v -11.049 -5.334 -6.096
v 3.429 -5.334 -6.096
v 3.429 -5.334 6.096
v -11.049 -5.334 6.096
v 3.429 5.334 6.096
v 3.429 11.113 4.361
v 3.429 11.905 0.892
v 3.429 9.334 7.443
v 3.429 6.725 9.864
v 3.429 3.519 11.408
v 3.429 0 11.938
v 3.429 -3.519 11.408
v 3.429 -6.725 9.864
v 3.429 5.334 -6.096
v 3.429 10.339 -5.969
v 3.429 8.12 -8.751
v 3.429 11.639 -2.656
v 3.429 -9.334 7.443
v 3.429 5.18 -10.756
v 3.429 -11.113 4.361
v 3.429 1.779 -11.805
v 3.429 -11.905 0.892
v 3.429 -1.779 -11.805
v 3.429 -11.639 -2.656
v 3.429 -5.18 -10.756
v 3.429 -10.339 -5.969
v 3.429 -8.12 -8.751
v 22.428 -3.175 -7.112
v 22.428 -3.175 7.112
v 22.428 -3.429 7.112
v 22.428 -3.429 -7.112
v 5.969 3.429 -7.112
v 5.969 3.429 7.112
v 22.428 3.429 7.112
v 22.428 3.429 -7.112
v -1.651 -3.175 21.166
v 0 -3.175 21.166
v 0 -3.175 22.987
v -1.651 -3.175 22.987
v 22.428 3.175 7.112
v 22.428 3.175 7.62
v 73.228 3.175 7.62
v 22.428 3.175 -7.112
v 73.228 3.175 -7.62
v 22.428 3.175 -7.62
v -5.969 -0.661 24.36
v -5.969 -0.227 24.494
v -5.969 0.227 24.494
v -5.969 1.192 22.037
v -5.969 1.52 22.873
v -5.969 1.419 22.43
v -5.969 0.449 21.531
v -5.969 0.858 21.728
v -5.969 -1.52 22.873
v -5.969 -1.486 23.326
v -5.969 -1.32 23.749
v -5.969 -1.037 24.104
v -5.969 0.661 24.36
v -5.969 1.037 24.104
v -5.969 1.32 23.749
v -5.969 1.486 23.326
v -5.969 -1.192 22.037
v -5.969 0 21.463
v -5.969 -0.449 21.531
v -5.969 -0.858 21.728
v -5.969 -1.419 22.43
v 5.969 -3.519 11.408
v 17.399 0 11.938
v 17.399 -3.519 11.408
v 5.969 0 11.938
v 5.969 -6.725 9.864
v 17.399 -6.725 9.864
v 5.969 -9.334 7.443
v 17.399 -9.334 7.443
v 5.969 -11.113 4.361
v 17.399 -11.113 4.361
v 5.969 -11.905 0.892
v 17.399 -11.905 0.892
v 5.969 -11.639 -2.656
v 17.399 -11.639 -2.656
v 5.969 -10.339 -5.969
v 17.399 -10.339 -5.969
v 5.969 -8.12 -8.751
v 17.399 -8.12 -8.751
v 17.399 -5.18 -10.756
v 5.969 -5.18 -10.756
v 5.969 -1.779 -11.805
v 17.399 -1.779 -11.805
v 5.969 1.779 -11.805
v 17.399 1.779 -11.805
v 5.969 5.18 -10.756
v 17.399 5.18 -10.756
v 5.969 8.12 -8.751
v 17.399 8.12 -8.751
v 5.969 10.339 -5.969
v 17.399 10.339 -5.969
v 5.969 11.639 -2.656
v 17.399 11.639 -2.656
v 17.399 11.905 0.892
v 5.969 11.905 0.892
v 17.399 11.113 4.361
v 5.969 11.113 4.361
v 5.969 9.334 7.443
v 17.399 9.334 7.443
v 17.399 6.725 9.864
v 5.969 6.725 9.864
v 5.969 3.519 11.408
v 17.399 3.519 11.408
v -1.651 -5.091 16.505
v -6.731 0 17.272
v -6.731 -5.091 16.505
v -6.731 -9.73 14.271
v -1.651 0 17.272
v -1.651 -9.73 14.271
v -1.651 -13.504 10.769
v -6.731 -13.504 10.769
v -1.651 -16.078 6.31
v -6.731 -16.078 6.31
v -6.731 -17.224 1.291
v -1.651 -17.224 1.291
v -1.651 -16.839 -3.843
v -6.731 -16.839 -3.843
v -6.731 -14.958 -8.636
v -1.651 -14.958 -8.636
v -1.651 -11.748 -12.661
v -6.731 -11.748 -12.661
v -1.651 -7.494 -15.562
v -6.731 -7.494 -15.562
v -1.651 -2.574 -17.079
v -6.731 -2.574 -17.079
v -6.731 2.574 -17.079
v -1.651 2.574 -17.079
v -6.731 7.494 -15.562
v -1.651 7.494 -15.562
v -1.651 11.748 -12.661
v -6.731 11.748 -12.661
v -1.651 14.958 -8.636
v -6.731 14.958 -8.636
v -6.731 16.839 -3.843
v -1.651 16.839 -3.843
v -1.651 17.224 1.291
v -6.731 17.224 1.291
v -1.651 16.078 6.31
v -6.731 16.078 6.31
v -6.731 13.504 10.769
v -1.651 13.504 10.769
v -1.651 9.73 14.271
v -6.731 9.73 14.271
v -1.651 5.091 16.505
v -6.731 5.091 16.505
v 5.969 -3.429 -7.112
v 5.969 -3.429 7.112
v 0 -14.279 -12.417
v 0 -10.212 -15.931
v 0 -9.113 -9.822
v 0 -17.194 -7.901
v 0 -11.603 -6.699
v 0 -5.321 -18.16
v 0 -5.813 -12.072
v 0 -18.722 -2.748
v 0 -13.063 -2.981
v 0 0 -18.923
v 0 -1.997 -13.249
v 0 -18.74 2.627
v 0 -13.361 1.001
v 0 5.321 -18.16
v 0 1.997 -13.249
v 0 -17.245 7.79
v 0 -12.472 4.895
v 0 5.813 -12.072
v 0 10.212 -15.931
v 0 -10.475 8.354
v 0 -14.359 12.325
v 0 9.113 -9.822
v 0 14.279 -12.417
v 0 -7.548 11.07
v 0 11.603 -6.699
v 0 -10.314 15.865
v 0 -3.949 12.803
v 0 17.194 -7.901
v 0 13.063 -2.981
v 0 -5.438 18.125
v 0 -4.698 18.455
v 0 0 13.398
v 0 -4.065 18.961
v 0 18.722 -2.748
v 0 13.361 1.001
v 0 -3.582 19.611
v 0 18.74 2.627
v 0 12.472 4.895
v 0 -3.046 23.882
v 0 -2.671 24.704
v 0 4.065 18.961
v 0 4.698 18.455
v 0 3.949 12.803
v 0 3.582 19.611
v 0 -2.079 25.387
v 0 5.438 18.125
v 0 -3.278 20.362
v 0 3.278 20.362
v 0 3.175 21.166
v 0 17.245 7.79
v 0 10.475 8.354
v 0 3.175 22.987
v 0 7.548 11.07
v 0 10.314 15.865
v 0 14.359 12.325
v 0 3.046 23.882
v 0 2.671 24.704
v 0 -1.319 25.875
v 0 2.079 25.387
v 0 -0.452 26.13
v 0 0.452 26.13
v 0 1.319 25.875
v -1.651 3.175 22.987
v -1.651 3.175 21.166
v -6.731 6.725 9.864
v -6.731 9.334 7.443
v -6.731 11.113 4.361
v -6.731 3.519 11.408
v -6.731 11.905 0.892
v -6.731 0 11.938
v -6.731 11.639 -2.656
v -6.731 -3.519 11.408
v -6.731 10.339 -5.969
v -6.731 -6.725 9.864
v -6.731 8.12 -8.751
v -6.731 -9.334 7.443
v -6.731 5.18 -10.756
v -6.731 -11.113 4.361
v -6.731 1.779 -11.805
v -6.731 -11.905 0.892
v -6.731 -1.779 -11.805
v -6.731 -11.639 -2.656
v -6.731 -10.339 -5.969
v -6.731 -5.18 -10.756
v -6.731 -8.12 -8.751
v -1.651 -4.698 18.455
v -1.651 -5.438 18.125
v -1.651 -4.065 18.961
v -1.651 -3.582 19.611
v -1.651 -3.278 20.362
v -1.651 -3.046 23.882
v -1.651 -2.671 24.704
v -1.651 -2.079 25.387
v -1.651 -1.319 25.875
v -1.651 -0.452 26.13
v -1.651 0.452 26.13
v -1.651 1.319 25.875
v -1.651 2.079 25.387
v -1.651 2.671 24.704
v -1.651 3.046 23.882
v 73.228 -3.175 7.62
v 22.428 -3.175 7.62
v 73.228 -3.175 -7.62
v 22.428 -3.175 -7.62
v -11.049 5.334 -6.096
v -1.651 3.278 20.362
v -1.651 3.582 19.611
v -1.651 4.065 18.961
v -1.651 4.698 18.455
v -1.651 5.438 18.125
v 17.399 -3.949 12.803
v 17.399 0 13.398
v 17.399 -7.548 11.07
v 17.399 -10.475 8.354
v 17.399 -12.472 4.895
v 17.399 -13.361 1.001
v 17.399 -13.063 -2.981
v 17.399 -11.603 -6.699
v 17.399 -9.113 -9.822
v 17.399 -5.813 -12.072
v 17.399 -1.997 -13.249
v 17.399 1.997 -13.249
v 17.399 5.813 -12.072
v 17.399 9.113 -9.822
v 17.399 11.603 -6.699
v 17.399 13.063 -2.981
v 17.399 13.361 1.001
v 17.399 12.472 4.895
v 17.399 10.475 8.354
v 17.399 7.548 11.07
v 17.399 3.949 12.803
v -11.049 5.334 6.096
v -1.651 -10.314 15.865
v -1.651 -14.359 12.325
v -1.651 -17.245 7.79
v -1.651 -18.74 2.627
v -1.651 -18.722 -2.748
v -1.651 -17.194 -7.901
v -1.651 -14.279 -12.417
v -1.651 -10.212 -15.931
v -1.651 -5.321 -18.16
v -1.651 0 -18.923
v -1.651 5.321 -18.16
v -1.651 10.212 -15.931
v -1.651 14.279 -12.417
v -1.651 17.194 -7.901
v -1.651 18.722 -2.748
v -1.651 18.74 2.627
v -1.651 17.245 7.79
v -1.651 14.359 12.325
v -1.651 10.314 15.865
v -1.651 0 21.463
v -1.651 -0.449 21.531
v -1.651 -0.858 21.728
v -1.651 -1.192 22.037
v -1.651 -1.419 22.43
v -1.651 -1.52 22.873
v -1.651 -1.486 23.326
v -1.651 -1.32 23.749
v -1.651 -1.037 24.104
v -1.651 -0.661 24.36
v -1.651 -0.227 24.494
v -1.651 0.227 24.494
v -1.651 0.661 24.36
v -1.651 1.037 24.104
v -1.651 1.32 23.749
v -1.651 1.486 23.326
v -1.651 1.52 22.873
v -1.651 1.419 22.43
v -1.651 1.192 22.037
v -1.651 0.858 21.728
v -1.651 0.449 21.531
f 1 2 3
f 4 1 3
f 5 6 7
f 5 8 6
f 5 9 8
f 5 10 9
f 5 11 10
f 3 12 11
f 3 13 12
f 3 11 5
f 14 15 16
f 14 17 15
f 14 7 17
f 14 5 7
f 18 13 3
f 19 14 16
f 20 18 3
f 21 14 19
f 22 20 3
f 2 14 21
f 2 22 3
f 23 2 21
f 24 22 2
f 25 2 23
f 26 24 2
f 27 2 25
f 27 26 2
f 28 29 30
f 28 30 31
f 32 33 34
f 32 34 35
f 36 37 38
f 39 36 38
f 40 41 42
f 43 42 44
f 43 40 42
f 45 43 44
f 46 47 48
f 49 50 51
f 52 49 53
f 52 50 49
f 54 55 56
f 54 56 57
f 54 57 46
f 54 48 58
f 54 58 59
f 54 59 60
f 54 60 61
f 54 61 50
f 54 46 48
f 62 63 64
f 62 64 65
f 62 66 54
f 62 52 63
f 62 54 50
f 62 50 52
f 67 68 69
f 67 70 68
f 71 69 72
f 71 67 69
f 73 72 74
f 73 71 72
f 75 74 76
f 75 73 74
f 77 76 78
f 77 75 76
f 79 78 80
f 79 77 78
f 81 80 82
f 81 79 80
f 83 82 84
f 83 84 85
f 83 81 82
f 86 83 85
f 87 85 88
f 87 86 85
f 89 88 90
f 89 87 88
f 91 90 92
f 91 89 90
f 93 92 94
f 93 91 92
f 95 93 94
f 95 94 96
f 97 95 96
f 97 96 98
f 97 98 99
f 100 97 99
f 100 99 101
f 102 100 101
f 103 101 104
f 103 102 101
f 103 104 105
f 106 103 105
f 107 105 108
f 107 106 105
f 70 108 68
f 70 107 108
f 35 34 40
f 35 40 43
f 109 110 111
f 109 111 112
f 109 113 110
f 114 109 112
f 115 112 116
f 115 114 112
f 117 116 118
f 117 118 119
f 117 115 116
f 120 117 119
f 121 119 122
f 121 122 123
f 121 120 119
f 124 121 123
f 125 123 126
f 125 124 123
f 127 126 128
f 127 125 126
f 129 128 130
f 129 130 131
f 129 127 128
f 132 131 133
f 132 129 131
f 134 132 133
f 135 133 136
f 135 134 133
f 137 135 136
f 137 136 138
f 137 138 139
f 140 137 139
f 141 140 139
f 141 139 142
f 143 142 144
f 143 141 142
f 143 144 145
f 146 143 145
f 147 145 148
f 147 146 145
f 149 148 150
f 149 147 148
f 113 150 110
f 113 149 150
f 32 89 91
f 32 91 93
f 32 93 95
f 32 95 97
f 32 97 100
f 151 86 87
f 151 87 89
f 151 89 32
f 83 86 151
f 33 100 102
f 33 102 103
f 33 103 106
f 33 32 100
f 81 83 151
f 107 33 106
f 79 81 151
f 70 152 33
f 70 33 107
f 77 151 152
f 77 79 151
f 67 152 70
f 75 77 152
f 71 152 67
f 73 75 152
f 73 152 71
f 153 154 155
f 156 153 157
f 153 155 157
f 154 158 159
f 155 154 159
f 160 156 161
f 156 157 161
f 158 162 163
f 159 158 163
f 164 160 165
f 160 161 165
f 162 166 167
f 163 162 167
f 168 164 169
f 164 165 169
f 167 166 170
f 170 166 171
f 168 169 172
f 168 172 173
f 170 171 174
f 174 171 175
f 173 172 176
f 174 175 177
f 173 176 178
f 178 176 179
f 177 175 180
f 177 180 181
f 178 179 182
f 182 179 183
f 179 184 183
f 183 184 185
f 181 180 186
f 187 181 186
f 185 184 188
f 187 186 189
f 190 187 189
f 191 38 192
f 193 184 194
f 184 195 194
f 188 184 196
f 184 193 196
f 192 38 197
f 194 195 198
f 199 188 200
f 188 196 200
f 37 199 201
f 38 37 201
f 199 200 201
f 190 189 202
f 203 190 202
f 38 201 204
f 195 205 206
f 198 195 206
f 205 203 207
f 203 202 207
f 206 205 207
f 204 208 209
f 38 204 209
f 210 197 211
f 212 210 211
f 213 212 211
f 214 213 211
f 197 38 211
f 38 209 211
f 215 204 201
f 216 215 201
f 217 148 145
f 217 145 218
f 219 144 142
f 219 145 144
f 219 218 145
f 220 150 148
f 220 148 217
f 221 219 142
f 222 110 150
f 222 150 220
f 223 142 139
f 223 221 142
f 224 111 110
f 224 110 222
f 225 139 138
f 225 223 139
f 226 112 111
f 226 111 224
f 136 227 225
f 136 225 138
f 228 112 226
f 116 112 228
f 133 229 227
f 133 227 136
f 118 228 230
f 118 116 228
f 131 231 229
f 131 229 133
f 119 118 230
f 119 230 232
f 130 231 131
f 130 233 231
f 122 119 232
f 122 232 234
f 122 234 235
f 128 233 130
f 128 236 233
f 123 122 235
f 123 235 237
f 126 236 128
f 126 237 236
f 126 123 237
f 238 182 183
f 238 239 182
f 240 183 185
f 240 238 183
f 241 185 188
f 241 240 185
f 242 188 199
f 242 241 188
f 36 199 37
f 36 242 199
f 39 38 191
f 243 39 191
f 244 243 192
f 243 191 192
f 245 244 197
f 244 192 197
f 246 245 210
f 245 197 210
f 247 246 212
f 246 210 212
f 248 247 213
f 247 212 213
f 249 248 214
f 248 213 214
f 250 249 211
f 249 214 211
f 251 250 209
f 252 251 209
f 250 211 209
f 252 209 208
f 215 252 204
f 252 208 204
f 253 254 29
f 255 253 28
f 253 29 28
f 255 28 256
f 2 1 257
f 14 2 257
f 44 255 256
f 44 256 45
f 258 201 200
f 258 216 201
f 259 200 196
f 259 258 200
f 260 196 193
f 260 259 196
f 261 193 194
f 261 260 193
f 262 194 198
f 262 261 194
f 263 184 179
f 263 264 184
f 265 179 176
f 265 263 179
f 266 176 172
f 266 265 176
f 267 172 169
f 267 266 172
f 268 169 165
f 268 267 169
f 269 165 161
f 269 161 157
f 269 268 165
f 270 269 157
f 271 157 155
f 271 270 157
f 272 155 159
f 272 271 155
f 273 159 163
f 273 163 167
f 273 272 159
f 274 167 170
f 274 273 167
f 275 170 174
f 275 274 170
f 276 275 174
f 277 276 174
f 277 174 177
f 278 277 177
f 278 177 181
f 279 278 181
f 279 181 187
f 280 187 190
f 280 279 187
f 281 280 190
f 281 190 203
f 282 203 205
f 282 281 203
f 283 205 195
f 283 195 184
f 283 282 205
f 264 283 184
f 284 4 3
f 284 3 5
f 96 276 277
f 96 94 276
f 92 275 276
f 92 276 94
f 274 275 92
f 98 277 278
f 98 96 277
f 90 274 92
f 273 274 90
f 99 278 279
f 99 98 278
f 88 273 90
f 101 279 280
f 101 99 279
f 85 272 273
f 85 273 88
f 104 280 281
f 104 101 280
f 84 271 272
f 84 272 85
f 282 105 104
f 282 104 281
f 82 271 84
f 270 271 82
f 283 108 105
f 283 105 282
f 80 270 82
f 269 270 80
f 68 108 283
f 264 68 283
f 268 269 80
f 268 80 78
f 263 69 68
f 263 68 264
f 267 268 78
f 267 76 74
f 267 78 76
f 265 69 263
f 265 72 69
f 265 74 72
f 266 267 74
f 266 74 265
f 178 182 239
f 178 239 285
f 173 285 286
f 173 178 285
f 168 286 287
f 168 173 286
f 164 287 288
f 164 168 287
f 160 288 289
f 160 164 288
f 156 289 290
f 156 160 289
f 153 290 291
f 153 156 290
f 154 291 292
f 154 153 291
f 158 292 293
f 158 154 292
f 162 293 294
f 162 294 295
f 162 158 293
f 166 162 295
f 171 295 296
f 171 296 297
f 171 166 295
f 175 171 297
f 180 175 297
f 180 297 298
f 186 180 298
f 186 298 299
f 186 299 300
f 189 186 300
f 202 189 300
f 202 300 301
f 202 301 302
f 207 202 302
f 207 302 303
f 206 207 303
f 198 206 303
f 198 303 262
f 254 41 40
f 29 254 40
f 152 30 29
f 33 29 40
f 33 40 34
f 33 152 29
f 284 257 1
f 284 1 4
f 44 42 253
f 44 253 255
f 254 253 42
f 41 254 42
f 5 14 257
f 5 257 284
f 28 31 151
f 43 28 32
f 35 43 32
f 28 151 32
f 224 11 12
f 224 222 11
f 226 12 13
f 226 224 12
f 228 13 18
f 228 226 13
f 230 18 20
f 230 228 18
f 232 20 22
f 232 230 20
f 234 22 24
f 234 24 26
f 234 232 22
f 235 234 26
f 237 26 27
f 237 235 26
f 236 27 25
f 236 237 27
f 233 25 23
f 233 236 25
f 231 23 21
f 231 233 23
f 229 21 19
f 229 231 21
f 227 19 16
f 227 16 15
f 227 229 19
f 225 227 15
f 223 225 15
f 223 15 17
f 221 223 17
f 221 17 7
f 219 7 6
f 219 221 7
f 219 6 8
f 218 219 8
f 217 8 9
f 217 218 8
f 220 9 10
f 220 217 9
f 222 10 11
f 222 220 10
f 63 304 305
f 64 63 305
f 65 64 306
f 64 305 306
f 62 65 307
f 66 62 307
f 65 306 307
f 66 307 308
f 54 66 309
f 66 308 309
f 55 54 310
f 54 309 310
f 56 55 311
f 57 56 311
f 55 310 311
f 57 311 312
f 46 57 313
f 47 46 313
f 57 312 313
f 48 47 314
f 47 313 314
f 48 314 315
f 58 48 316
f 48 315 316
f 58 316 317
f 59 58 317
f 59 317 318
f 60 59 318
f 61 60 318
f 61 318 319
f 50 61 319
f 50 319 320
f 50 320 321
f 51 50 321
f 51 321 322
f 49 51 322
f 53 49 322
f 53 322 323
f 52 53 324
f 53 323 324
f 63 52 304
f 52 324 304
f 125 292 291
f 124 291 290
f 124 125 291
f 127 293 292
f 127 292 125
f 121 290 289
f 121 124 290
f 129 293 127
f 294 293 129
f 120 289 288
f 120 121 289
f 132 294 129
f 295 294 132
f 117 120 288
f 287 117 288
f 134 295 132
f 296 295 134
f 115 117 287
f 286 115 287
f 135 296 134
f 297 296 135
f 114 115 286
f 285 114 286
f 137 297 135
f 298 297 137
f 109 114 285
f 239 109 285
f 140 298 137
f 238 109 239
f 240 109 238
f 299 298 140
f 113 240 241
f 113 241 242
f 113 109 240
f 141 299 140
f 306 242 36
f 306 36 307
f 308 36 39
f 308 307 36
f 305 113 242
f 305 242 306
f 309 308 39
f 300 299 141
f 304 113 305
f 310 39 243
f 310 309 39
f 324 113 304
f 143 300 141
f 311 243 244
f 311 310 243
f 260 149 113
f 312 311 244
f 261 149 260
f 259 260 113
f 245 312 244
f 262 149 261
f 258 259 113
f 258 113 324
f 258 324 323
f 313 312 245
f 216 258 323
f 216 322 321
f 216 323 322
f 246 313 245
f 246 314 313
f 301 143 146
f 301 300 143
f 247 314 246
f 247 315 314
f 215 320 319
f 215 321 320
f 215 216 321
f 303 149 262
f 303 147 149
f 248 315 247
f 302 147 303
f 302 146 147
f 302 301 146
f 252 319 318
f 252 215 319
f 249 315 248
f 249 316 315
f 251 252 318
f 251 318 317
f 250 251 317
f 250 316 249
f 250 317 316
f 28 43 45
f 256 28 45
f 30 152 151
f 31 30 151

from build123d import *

# Parameters (mm, degrees)
SKETCH2_W      = 12.192
SKETCH2_H      = 10.668
EXTRUDE1_DEPTH = 14.478
SKETCH3_W      = 14.224
SKETCH3_H      = 6.858
EXTRUDE2_DEPTH = 16.4592
EXTRUDE3_START = -1.651
EXTRUDE3_DEPTH = 1.651
FILLET1_R      = 3.175
SKETCH5_R      = 1.524
EXTRUDE4_DEPTH = 4.318
SKETCH6_W      = 15.24
SKETCH6_H      = 6.35
EXTRUDE5_DEPTH = 50.8


with BuildPart() as part:
    # Sketch1 → Revolve1 (revolve)
    with BuildSketch(Plane.XY, mode=Mode.PRIVATE) as revolve1_sk:
        Polygon((0, 13.3985), (17.399, 13.3985), (17.399, 11.938), (5.969, 11.938), (5.969, 0), (3.429, 0), (3.429, 11.938), (-6.731, 11.938), (-6.731, 17.272), (-1.651, 17.272), (-1.651, 18.923), (0, 18.923), align=None)
    revolve(revolve1_sk.sketch.rotate(Axis((-7.9375, 0, 0), (1, 0, 0)), 90), axis=Axis((-7.9375, 0, 0), (1, 0, 0)))

    # Sketch2 → Extrude1 (add)
    with BuildSketch(Plane.ZY.offset(-3.429)):
        Rectangle(SKETCH2_W, SKETCH2_H)
    extrude(amount=EXTRUDE1_DEPTH)

    # Sketch3 → Extrude2 (add)
    with BuildSketch(Plane(origin=(5.969, 0, 0), x_dir=(0, 0, -1), z_dir=(1, 0, 0))):
        Rectangle(SKETCH3_W, SKETCH3_H)
    extrude(amount=EXTRUDE2_DEPTH)

    # Sketch4 → Extrude3 (add)
    with BuildSketch(Plane.ZY.offset(1.651).offset(EXTRUDE3_START)):
        with BuildLine():
            Line((22.987, 3.175), (18.654739451, 3.175))
            ThreePointArc((18.654739451, 3.175), (18.923, 0), (18.654739451, -3.175))
            Line((18.654739451, -3.175), (22.987, -3.175))
            ThreePointArc((22.987, -3.175), (26.162, 0), (22.987, 3.175))
        make_face()
    extrude(amount=EXTRUDE3_DEPTH)

    # Fillet1
    fillet1_edges = [part.edges().sort_by_distance(p)[0] for p in [
        (-0.8255, 3.175, 18.654739451),
        (-0.8255, -3.175, 18.654739451),
    ]]
    fillet(fillet1_edges, radius=FILLET1_R)

    # Sketch5 → Extrude4 (add)
    with BuildSketch(Plane.ZY.offset(1.651)):
        with Locations(Location((22.987, 0, 0), (0, 0, 180))):
            Circle(SKETCH5_R)
    extrude(amount=EXTRUDE4_DEPTH)

    # Sketch6 → Extrude5 (add)
    with BuildSketch(Plane(origin=(22.4282, 0, 0), x_dir=(0, 0, -1), z_dir=(1, 0, 0))):
        Rectangle(SKETCH6_W, SKETCH6_H)
    extrude(amount=EXTRUDE5_DEPTH)


solid = part.part
